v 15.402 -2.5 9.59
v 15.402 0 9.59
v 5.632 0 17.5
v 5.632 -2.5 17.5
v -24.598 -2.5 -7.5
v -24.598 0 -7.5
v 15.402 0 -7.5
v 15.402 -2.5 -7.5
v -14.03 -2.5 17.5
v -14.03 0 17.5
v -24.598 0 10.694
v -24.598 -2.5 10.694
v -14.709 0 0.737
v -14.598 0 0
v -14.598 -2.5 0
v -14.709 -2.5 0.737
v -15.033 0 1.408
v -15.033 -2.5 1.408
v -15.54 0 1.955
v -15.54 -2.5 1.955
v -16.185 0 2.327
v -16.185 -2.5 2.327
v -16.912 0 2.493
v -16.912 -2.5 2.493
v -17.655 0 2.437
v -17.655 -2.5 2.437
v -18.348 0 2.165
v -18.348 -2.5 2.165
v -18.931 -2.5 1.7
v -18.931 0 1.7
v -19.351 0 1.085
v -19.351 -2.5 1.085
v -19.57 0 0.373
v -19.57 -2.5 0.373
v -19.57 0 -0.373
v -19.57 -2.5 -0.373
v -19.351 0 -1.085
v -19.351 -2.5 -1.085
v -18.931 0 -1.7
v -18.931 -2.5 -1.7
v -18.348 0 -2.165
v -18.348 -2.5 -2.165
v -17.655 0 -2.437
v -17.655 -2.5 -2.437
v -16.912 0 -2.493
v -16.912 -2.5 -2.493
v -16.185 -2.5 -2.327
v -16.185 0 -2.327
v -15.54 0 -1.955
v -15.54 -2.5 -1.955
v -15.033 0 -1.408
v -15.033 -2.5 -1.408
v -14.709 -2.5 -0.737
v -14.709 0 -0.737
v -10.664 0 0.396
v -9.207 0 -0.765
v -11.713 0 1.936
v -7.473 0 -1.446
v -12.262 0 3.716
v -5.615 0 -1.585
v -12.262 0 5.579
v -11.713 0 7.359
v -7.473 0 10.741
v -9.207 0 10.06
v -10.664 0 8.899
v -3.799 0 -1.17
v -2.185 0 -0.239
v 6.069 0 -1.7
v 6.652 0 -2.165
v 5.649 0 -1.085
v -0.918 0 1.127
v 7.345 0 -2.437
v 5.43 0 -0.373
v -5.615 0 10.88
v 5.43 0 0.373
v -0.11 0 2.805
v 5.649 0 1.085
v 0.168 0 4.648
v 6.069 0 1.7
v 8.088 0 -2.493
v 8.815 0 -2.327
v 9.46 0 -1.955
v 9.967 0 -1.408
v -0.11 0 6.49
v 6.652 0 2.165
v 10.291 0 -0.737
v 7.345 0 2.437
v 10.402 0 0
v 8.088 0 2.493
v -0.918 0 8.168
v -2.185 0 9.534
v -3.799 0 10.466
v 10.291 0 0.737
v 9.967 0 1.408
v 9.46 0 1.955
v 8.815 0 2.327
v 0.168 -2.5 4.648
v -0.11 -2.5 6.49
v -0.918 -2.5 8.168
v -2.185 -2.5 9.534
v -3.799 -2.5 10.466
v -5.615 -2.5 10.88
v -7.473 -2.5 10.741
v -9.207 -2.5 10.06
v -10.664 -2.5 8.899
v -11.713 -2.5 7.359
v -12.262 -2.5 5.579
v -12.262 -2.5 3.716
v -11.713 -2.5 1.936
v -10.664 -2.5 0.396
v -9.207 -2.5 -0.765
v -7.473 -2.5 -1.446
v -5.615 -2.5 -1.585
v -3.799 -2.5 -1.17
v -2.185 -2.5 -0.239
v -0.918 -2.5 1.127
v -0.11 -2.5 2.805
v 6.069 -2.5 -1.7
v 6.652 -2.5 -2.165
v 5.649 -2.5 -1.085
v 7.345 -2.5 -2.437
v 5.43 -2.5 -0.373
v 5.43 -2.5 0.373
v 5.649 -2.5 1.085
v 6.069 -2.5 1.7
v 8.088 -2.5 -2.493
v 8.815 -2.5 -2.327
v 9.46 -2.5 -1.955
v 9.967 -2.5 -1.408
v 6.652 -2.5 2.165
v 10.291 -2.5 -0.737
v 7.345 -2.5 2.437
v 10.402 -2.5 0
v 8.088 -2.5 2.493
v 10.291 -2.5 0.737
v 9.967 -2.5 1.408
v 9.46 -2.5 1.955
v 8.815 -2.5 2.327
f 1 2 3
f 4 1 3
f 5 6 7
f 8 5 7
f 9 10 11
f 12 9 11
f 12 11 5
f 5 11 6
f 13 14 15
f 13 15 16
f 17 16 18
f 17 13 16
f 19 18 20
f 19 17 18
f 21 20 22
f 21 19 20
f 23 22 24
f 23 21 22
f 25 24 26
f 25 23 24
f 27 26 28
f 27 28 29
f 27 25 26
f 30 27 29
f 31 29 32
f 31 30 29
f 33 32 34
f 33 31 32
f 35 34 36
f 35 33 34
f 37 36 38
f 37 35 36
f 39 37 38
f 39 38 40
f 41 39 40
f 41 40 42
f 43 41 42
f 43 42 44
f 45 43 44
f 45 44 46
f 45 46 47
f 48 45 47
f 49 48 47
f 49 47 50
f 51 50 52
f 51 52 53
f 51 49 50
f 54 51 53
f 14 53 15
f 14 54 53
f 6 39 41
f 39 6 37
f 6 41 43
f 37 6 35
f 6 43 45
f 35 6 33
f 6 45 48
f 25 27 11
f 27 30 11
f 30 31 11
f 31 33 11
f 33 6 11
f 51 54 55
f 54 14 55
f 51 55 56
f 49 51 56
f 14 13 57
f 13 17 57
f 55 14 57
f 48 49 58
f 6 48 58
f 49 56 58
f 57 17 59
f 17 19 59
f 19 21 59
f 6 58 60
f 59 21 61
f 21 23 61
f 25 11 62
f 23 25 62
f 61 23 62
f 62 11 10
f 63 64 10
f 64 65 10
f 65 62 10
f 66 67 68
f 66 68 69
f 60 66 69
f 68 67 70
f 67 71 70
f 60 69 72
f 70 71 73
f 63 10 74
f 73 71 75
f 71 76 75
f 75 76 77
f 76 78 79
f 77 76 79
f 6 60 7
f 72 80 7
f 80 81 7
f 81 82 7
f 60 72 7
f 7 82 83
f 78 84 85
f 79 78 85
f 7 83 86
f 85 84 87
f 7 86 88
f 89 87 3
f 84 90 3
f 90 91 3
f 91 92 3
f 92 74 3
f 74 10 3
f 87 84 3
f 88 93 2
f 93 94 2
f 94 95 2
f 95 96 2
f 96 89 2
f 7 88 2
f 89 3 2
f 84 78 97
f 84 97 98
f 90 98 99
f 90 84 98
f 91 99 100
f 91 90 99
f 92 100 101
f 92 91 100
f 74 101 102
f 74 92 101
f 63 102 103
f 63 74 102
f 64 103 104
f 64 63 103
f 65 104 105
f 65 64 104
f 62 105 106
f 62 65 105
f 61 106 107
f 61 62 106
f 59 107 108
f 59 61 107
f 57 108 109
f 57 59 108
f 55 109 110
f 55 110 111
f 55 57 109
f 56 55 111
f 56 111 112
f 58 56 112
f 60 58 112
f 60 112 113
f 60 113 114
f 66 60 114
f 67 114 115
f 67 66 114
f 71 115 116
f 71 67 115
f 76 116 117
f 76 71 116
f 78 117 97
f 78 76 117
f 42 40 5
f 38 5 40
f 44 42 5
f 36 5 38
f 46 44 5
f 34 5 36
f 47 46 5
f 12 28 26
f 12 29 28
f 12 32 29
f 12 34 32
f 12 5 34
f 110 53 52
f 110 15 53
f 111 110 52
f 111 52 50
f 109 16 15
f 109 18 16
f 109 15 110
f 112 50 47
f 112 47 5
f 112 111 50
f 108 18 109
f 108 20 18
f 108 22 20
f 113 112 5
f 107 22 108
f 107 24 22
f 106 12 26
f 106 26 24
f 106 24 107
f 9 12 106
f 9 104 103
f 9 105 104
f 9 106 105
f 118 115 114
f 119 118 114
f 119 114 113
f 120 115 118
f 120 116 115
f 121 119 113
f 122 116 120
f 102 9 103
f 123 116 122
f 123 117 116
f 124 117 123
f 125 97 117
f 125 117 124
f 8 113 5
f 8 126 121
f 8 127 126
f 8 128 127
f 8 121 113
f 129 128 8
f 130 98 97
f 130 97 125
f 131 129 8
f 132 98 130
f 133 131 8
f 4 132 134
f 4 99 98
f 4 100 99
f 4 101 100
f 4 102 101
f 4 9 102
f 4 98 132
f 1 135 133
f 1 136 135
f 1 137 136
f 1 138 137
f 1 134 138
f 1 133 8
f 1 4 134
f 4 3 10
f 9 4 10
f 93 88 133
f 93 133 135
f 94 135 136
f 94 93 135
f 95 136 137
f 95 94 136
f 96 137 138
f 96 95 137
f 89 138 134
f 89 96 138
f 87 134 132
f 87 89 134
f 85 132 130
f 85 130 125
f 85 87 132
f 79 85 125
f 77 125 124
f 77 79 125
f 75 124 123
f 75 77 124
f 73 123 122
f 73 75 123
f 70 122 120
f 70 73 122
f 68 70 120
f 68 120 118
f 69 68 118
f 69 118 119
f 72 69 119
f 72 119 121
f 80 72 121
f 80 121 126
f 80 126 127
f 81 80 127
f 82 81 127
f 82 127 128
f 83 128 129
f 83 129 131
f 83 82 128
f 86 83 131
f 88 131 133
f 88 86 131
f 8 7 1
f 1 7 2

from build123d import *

# Parameters (mm, degrees)
F0_R     = 2.5
F0_R_2   = 6.25
F1_DEPTH = 2.5


with BuildPart() as f1:
    # F0 (on Front) → F1 (new body)
    with BuildSketch(Plane.XZ):
        Polygon((-14.030276, 17.5), (-24.598361, 10.694085), (-24.598361, -7.5), (15.401639, -7.5), (15.401639, 9.590163), (5.632331, 17.5), align=None)
        with Locations((-17.098361, 0)):
            Circle(F0_R, mode=Mode.SUBTRACT)
        with Locations((-6.081968, 4.647542)):
            Circle(F0_R_2, mode=Mode.SUBTRACT)
        with Locations((7.901639, 0)):
            Circle(F0_R, mode=Mode.SUBTRACT)
    extrude(amount=F1_DEPTH)


solid = f1.part
